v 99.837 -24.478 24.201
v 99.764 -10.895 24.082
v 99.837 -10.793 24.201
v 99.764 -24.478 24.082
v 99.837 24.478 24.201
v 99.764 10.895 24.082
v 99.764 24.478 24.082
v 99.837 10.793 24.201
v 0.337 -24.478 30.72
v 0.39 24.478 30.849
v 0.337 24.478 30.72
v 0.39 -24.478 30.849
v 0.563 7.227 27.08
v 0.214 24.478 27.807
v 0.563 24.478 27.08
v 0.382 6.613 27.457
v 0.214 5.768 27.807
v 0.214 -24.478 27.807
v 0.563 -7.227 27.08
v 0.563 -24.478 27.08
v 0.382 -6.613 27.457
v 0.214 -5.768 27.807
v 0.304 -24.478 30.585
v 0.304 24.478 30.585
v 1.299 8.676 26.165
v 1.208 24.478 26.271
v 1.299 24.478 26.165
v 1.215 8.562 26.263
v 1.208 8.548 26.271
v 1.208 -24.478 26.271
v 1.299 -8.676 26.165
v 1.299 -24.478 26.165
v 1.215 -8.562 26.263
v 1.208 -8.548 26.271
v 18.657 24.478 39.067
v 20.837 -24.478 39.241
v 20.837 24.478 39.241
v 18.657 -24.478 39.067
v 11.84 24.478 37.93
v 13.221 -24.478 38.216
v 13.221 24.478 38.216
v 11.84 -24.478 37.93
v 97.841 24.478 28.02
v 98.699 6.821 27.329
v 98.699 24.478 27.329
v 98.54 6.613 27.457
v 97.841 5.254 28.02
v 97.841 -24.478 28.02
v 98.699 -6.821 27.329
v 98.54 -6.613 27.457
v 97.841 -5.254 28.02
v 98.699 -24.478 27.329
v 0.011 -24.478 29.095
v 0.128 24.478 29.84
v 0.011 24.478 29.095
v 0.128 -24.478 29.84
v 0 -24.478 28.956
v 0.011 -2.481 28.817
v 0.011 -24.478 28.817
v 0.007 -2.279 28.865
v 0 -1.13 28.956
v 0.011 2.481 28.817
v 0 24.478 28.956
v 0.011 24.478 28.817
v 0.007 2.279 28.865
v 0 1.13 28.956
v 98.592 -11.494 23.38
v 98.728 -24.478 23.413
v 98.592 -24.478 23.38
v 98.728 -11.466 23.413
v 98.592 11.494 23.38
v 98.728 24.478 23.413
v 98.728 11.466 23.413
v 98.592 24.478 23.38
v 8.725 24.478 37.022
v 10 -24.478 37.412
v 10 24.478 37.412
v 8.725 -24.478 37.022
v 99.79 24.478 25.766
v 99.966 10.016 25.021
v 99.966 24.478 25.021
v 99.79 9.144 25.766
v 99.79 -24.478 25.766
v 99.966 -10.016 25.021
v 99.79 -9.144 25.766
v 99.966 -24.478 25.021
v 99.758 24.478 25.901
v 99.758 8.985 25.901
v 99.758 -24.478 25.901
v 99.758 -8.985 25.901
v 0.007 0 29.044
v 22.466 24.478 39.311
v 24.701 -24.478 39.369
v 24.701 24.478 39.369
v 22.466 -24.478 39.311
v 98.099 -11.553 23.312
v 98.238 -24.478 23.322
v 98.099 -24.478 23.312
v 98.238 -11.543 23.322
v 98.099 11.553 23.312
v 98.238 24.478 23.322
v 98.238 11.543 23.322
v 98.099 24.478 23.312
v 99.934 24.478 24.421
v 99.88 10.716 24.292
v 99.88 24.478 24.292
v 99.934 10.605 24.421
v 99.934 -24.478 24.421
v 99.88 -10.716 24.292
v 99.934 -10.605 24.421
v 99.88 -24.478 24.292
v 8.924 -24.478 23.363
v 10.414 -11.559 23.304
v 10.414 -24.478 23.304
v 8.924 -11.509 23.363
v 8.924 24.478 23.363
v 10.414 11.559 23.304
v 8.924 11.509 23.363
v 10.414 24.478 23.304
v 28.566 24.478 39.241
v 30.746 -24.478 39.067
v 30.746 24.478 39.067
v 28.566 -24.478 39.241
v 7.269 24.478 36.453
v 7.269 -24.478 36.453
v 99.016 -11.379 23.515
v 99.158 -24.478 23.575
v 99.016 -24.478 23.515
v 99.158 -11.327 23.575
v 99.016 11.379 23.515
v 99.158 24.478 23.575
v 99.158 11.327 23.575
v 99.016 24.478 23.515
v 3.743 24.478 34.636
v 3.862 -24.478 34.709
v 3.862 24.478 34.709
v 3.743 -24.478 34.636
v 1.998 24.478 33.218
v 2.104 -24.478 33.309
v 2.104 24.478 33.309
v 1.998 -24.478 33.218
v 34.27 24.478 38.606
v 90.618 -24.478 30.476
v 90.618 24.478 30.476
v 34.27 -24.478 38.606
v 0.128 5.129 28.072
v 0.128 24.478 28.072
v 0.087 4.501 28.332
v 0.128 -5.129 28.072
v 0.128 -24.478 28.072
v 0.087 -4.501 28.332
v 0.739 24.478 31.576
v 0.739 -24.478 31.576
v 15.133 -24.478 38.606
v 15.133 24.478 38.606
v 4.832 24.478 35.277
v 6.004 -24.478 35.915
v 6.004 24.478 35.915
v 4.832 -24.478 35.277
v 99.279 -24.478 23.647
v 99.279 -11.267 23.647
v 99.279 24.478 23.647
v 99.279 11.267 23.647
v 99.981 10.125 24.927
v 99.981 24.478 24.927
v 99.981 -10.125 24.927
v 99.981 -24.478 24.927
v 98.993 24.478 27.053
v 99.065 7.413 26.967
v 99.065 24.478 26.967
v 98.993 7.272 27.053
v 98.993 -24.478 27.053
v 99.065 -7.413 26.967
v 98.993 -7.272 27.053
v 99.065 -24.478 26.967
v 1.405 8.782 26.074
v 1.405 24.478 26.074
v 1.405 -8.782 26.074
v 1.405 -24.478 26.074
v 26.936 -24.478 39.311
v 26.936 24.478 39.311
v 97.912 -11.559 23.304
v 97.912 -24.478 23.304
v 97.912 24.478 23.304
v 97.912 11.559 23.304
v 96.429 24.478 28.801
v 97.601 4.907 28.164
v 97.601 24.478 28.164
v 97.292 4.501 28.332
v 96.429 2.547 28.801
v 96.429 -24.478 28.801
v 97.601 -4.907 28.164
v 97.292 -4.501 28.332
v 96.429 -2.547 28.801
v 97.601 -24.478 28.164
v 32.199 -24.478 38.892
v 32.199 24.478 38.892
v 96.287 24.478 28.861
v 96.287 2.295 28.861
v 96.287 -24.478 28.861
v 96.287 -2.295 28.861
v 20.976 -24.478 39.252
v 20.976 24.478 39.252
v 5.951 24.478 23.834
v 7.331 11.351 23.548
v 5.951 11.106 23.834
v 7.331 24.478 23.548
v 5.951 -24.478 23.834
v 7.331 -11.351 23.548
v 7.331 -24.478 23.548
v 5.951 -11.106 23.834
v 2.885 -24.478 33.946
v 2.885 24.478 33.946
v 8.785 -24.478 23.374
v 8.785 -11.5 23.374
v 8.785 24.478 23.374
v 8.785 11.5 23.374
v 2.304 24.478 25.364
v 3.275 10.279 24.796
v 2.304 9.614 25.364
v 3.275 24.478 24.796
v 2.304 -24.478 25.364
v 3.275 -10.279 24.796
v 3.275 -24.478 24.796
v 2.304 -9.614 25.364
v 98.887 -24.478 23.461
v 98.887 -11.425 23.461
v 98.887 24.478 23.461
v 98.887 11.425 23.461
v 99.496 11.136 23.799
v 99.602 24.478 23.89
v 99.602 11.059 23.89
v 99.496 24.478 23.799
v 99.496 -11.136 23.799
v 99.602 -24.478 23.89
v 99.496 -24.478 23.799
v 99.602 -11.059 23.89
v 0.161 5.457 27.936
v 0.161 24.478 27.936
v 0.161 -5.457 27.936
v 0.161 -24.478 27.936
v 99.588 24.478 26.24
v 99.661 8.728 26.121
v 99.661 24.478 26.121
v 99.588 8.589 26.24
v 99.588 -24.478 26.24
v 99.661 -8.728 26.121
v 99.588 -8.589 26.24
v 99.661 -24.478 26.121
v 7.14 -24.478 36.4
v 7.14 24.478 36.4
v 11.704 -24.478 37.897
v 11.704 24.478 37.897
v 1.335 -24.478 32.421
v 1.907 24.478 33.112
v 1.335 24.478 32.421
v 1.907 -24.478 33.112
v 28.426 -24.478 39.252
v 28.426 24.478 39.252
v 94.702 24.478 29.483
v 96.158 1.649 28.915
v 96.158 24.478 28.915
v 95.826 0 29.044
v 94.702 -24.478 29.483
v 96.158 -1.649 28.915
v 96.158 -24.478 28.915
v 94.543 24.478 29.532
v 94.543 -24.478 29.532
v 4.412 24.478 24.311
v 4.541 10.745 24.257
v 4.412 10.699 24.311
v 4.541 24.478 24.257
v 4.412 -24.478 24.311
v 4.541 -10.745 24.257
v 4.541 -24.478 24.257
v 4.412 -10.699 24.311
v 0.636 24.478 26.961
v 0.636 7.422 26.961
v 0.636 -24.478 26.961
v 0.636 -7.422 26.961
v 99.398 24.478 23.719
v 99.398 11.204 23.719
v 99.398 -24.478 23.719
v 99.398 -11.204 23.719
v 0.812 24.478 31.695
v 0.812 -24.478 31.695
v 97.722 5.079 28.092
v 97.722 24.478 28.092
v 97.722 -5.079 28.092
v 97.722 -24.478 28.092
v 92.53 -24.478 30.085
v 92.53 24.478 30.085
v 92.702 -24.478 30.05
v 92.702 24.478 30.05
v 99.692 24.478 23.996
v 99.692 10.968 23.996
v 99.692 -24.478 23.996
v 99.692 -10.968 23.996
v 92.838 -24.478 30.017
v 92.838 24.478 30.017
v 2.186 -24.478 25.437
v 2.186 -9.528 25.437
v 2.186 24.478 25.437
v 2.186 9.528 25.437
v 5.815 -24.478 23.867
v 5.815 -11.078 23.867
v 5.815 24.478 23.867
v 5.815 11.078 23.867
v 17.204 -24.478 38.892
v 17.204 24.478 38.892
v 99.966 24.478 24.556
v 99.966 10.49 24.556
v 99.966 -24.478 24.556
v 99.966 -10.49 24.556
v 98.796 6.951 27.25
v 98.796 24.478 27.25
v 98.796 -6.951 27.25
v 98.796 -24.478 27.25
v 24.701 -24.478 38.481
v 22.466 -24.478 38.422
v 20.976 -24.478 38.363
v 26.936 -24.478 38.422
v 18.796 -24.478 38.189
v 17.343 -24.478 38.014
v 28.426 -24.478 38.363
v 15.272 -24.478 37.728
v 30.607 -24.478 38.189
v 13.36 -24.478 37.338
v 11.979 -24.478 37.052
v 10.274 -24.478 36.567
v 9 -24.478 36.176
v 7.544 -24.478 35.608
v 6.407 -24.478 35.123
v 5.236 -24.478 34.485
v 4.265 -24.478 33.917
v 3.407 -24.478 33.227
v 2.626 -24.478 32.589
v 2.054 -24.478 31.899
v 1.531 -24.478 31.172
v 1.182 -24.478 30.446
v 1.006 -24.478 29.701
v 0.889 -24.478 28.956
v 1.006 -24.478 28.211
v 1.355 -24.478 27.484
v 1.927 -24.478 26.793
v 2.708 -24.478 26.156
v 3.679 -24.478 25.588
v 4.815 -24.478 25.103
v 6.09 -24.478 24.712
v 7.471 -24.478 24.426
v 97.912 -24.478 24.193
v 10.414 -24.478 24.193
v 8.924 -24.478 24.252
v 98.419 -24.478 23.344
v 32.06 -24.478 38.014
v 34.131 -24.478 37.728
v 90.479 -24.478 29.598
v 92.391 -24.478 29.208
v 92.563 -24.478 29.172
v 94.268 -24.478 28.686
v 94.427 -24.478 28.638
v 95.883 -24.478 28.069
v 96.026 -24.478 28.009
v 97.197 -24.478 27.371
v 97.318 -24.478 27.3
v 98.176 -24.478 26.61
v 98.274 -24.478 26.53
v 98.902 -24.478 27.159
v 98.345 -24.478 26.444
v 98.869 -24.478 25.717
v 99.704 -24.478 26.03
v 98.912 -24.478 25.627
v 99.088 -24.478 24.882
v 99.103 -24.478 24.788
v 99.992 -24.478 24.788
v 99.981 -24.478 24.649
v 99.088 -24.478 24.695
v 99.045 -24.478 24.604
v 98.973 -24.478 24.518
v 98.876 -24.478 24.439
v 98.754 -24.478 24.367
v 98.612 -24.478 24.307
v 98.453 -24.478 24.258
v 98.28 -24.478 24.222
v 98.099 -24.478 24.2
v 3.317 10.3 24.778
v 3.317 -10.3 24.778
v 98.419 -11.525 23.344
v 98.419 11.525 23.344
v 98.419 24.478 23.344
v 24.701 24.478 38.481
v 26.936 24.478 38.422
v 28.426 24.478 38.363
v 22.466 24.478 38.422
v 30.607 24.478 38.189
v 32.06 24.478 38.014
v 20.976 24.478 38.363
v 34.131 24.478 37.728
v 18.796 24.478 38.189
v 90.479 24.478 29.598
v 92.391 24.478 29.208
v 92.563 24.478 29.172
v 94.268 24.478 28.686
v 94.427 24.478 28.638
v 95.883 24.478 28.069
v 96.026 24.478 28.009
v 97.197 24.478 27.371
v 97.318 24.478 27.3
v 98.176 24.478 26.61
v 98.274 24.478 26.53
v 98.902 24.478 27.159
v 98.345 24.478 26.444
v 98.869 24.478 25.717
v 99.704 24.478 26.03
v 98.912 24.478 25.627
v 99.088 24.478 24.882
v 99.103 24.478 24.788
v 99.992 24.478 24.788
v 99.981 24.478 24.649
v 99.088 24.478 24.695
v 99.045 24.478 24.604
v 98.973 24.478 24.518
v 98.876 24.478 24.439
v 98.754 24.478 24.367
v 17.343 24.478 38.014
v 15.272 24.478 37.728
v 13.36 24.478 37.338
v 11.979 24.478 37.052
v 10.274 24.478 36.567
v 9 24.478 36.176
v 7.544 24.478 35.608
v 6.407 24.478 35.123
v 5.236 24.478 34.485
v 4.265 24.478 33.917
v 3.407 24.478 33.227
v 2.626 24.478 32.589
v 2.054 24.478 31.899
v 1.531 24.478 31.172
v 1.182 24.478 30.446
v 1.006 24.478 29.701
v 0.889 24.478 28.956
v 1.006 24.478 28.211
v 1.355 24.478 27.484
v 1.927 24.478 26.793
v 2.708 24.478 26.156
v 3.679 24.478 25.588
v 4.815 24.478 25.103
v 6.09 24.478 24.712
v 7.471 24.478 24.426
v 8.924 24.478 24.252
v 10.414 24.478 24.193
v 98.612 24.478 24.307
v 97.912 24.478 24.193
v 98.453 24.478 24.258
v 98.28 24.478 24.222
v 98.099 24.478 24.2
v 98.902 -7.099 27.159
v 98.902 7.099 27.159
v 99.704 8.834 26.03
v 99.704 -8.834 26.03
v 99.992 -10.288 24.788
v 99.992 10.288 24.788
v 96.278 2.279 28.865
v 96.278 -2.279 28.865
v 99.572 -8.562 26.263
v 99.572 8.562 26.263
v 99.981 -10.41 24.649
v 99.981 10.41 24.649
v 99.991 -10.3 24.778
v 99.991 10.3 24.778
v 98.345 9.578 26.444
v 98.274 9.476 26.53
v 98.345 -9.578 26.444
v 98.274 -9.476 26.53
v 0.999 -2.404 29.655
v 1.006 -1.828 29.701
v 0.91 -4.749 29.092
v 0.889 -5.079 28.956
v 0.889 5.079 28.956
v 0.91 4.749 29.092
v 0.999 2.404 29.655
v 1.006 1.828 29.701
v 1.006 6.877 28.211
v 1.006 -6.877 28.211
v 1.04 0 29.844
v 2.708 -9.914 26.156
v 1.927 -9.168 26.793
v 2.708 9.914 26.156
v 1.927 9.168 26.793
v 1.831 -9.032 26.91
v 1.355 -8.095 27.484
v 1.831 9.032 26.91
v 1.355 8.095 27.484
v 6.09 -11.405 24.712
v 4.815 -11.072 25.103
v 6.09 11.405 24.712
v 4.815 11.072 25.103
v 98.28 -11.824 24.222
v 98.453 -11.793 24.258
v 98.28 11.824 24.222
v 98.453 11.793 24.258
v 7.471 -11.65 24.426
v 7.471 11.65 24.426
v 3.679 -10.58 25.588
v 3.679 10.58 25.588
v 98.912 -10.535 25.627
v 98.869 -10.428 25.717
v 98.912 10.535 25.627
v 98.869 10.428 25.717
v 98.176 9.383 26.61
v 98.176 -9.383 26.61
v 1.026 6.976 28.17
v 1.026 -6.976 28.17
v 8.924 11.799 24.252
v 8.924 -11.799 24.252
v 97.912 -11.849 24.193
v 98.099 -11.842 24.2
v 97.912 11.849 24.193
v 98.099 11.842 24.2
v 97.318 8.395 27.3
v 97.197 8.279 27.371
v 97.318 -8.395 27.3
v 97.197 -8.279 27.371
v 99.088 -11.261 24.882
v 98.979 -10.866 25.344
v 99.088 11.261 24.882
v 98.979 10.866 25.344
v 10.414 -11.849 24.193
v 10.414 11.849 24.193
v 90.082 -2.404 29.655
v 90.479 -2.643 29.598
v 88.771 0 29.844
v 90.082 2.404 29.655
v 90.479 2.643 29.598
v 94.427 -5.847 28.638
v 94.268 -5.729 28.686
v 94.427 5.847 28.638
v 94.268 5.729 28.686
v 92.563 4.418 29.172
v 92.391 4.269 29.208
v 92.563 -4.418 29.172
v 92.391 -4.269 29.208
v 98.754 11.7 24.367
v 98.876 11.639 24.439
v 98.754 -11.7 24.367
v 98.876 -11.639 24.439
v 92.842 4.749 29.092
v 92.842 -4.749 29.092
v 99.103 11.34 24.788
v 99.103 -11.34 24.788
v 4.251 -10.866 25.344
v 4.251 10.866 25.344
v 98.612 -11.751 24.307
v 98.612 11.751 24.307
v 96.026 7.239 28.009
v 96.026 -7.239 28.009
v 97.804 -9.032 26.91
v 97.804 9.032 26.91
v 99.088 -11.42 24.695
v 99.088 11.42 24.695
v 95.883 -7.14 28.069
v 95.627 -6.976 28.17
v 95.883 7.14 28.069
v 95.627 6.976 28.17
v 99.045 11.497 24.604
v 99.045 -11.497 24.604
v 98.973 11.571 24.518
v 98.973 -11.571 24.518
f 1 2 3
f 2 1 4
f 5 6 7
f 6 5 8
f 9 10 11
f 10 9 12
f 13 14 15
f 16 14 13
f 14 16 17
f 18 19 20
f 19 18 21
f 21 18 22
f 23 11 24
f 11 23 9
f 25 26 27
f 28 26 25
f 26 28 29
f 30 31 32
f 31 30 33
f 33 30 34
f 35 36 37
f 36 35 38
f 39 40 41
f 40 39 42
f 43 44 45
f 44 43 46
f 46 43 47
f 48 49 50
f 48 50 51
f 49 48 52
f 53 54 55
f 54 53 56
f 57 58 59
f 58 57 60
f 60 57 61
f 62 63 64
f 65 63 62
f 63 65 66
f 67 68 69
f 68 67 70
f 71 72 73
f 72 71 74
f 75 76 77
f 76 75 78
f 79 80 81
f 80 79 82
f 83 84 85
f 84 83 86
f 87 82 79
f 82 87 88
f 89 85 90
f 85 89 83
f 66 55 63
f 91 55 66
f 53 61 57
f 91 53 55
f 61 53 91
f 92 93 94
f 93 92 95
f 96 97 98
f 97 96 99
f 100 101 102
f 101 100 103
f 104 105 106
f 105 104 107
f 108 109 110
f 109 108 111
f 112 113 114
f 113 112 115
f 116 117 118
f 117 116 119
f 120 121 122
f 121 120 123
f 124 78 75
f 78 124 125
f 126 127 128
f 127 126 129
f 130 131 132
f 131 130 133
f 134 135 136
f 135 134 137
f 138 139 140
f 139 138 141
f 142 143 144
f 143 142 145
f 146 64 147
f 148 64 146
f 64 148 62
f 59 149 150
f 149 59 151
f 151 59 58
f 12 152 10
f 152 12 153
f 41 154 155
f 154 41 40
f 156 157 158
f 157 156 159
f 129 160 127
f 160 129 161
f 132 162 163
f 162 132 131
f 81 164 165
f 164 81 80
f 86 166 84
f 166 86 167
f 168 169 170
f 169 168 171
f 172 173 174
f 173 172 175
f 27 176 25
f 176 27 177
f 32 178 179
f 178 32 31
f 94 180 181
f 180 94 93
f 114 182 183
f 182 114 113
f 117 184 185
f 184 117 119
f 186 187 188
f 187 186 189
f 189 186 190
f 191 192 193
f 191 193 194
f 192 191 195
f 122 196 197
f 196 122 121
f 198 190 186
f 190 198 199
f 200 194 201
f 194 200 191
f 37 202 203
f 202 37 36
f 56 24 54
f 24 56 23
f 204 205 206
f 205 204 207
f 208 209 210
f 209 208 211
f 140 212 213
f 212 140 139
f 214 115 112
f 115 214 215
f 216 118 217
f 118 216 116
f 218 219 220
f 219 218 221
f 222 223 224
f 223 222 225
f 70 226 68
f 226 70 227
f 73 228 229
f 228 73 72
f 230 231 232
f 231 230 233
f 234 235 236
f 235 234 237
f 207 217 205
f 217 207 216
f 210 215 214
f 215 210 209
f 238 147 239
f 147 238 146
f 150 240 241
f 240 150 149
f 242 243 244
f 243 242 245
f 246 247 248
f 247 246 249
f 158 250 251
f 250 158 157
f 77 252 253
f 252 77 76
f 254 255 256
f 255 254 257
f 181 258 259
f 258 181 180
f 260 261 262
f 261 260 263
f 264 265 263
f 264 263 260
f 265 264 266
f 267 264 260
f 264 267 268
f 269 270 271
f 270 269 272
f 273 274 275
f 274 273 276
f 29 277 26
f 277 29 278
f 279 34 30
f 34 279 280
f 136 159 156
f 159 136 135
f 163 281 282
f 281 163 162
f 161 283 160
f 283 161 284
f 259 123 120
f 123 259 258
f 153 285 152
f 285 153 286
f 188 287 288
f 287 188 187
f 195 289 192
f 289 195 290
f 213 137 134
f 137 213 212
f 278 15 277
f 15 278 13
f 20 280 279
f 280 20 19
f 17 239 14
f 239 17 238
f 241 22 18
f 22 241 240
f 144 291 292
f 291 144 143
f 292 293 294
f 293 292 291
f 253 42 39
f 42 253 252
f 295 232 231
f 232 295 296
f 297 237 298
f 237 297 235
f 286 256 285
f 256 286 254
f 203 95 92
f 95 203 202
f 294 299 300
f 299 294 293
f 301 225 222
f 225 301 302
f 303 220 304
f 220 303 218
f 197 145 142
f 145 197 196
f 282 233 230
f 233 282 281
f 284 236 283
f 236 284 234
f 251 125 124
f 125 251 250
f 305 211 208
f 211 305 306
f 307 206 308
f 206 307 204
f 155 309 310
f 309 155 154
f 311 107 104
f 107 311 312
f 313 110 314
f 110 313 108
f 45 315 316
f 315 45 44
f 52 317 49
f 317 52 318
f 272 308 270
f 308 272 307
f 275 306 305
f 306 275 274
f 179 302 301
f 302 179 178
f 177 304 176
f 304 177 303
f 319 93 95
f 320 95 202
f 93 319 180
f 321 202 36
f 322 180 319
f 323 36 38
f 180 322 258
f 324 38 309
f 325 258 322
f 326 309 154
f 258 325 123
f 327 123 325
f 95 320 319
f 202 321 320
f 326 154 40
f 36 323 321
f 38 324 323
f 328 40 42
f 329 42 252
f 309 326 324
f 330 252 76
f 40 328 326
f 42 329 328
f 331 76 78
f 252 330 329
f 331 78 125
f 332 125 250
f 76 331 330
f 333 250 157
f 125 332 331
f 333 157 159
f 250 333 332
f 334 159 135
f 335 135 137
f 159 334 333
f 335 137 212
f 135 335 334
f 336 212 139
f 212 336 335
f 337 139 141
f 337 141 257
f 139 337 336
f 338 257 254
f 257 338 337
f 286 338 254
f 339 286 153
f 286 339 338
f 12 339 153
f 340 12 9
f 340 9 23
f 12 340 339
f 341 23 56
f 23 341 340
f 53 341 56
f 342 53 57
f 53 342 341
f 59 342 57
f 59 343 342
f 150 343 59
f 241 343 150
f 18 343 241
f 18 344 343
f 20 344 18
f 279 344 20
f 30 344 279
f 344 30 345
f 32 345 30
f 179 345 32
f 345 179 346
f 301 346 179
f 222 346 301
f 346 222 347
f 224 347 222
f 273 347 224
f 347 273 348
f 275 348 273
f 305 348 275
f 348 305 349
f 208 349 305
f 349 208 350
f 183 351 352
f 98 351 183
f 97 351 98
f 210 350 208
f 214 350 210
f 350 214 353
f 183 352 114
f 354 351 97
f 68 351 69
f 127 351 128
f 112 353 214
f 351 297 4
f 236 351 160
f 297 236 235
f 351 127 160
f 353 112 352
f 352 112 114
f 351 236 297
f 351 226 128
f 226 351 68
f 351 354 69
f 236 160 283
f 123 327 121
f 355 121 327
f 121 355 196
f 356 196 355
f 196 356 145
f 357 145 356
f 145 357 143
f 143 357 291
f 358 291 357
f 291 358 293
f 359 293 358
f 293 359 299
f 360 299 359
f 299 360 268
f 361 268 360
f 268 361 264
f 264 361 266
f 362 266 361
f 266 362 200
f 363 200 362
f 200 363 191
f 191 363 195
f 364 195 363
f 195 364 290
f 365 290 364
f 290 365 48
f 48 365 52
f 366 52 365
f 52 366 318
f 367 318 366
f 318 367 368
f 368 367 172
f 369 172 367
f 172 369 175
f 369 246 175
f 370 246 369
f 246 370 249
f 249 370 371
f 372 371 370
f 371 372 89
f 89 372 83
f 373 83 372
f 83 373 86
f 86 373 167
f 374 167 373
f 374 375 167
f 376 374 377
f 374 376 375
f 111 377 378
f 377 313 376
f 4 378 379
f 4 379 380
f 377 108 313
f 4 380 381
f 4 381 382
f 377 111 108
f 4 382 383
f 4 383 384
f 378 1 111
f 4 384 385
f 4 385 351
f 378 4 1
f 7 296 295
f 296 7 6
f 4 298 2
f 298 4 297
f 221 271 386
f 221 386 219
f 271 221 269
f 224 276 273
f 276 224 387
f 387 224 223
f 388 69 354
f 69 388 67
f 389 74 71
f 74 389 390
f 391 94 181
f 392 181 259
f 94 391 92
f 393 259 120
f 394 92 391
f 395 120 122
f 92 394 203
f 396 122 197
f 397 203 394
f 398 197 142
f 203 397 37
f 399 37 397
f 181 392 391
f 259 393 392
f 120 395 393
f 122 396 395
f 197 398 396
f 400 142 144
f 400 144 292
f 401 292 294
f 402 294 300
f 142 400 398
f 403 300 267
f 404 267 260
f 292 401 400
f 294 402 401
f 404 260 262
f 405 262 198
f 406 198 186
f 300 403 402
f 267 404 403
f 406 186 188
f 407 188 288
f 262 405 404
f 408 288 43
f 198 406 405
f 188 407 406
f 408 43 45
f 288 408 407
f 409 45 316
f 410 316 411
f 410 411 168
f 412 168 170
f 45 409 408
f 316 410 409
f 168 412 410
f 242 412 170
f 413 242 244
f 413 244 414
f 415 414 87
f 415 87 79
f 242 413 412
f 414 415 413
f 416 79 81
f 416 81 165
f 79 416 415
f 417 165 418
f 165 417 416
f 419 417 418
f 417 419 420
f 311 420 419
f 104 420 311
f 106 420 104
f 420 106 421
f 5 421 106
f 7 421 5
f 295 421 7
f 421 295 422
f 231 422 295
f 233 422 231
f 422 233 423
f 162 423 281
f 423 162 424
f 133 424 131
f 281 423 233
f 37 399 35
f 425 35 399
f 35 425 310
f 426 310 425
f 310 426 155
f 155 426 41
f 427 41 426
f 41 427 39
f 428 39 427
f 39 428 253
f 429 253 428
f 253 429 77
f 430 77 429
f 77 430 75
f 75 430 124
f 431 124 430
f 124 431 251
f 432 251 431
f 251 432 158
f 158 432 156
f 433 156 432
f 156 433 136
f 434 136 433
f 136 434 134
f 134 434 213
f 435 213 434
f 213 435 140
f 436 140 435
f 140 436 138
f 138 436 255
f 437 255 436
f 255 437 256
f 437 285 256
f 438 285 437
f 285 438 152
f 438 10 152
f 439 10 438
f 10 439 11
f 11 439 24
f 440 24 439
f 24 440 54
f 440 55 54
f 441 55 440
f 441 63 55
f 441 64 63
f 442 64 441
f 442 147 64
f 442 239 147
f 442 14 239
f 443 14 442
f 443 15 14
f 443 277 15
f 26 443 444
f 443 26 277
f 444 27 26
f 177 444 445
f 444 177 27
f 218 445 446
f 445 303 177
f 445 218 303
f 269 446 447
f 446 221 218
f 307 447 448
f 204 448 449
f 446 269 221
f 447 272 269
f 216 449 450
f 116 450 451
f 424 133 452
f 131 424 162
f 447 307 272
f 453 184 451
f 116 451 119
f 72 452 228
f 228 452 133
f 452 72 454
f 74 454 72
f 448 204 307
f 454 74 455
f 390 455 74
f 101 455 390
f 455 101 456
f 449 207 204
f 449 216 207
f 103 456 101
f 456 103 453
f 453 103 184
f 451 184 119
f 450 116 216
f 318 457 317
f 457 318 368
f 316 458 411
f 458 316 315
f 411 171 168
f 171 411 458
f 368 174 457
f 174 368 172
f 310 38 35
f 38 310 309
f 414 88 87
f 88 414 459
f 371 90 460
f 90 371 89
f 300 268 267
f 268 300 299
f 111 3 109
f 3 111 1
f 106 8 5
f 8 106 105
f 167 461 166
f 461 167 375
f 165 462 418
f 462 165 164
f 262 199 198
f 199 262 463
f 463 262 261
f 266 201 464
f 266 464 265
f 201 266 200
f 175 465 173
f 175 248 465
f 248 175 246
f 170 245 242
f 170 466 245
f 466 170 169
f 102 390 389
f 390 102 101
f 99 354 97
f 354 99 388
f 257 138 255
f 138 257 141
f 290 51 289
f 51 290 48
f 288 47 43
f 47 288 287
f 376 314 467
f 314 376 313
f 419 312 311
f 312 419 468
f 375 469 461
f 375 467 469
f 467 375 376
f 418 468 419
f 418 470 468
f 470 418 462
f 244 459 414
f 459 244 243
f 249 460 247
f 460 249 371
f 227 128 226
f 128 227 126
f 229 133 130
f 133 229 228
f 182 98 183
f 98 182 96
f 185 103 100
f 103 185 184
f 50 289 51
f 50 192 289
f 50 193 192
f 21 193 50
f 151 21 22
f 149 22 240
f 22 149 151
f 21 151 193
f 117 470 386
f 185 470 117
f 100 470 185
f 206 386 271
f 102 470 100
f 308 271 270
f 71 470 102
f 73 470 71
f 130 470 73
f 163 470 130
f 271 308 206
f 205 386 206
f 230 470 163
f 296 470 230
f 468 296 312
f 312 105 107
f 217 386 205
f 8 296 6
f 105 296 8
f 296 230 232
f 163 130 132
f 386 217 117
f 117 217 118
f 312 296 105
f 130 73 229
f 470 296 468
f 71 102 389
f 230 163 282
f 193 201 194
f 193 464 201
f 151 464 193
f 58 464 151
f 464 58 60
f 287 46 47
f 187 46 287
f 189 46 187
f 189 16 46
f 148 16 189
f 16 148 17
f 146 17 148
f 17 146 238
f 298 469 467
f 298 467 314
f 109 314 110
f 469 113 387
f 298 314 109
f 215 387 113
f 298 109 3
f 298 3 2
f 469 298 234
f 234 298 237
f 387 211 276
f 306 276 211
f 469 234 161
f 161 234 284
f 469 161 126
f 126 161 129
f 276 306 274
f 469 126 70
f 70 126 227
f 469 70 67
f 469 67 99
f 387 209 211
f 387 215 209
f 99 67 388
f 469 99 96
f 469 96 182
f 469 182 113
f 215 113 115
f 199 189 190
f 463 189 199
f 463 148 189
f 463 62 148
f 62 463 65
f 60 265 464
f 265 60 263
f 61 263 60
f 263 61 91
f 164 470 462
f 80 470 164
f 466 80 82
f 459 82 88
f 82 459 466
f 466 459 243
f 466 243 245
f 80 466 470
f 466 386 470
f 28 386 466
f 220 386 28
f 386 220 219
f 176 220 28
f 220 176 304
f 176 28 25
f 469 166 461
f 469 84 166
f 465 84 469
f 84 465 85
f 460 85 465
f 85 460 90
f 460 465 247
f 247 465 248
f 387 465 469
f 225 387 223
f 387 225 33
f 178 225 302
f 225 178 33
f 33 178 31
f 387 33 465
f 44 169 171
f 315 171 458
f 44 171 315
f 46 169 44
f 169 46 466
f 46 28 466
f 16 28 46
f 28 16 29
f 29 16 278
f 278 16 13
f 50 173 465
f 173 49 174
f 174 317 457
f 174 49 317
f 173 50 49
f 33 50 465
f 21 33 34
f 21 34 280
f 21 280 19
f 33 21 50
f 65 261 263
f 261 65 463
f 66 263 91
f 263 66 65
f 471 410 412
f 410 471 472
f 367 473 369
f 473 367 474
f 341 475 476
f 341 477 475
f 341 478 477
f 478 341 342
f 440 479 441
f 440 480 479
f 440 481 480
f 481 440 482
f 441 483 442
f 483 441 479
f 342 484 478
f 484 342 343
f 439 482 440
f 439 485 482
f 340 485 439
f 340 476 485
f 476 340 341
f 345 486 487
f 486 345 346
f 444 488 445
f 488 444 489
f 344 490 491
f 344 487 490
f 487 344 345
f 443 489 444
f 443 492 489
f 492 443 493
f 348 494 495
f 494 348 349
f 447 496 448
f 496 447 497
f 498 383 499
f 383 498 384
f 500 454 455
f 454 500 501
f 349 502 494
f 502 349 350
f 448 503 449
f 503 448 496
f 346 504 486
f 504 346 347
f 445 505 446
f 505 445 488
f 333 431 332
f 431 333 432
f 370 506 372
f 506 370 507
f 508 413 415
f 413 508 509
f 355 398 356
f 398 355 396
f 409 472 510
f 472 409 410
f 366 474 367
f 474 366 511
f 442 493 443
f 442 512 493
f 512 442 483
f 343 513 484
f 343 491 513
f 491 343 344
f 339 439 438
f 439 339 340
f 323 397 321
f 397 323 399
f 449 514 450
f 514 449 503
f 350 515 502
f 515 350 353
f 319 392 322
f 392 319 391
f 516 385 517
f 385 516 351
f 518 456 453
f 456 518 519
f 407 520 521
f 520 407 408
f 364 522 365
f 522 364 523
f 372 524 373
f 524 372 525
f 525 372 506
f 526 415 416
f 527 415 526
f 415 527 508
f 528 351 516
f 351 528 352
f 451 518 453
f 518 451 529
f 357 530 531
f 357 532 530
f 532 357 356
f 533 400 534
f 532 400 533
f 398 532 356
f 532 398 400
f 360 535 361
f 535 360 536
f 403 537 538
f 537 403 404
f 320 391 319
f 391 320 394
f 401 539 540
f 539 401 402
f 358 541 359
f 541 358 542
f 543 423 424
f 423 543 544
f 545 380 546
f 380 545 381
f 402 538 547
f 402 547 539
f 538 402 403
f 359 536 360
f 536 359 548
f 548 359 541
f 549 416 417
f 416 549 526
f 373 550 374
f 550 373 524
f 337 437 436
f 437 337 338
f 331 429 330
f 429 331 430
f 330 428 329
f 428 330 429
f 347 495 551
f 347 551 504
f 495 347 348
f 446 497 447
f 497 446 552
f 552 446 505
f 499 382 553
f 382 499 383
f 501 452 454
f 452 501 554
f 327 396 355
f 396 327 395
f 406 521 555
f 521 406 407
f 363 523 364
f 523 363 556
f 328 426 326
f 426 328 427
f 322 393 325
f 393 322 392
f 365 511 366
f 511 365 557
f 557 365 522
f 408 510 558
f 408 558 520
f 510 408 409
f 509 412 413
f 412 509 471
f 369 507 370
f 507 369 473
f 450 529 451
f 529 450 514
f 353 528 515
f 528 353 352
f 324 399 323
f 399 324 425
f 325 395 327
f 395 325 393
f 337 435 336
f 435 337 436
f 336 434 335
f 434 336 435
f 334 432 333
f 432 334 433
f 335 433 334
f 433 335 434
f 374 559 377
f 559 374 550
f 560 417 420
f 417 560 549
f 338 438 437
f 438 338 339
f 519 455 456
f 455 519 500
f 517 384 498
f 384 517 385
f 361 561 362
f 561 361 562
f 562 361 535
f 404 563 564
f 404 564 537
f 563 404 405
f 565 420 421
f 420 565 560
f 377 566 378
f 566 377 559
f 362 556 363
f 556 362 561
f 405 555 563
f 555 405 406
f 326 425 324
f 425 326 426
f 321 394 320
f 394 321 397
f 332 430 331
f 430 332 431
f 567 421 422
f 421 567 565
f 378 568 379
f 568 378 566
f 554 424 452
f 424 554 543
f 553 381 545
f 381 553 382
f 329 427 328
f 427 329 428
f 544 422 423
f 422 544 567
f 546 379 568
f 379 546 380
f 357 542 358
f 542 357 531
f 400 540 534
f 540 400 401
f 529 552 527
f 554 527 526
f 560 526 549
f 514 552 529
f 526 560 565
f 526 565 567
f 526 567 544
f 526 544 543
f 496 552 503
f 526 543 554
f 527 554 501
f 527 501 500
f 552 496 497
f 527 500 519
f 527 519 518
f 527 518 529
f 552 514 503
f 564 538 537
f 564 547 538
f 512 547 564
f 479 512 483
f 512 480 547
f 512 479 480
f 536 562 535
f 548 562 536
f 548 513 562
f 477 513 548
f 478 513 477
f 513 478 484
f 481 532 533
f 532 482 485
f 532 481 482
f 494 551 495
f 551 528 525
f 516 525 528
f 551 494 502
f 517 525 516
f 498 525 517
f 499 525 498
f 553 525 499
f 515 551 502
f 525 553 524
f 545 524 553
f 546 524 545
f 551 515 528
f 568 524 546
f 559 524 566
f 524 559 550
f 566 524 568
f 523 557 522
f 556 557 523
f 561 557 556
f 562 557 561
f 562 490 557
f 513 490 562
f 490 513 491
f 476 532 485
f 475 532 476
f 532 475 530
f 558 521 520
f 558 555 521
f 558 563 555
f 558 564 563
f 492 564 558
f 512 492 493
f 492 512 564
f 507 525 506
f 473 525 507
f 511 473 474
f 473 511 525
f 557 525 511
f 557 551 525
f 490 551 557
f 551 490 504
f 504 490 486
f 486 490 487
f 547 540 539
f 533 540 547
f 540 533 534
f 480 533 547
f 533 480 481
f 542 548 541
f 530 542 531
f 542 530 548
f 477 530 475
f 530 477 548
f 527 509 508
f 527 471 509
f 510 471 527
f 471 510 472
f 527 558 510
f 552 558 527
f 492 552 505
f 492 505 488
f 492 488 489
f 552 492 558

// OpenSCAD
inch=25.4;
slip=0.007*inch;
kerf=0.0035*inch;
comfort=0.25;

build_stl=0;

fineness_stl=200;
fineness_low=40;

printer_bed=100;
printer_extruder=0.4;
printer_layer=0.31;

cargo_width=1*inch;
cargo_space=cargo_width+kerf*2;

hull_thickness=0.8;

hull_support=hull_thickness*2+kerf;

hull_width=cargo_width+kerf*4+hull_thickness*4;
hull_height=2*inch+hull_support*4+kerf*4;

conduit_large=cargo_width/2+kerf*2;

airframe_connector_length=5;
airframe_connector_seam=0.8;
airframe_lock_depth=0.1;
airframe_lock_length=0.3;
airframe_lock_float=0.1;

cabin_length=100;//4*inch;

wing_span=72*inch;
wing_root_chord=4*inch;
wing_segment=4*inch;
wing_root_height=0.75*inch;
wing_taper=.25*3/16*inch;
wing_dihedral_angle=5;

wing_connector_length=10;

wing_angle_of_attack=10;

tail_height=4*inch;
tail_rudder_chord=inch;
tail_taper_percent=0.5;

fineness=build_stl?fineness_stl:fineness_low;



module airframe_linkage(){
    difference(){
        hull(){
            translate([0,-0.5*(hull_height-hull_width),0])
            circle(0.5*hull_width,$fn=fineness);
            
            translate([0,0.5*(hull_height-hull_width),0])
            circle(0.5*hull_width,$fn=fineness);
        }
        square(cargo_space,center=true);
        
        translate([0,0.5*cargo_space+hull_support+conduit_large/2,0])
        circle(conduit_large/2,$fn=fineness);
        
        translate([0,-0.5*cargo_space-hull_support-conduit_large/2,0])
        circle(conduit_large/2,$fn=fineness);
    }
}

module airframe_inset(){
    difference(){
        hull(){
            translate([0,-0.5*(hull_height-hull_width),0])
            circle(0.5*hull_width-hull_support/2-kerf,$fn=fineness);
            
            translate([0,0.5*(hull_height-hull_width),0])
            circle(0.5*hull_width-hull_support/2-kerf,$fn=fineness);
        }
        square(size=[cargo_space,cargo_space+hull_support*2+kerf*2],center=true);
        
        translate([0,0.5*cargo_space+hull_support+kerf,0])
        circle(cargo_space/2,$fn=fineness);
        
        translate([0,-0.5*cargo_space-hull_support-kerf,0])
        circle(cargo_space/2,$fn=fineness);
    
    }
}

module airframe_outset(){
    difference(){
        hull(){
            translate([0,-0.5*(hull_height-hull_width),0])
            circle(0.5*hull_width,$fn=fineness);
            
            translate([0,0.5*(hull_height-hull_width),0])
            circle(0.5*hull_width,$fn=fineness);
        }
        
        //square(size=[cargo_space+hull_support+kerf*2,cargo_space+(hull_support+kerf)*2],center=true);
        
        hull(){
        translate([0,0.5*cargo_space+hull_support,0])
        circle(cargo_space/2+hull_support/2,$fn=fineness);
        
        translate([0,-0.5*cargo_space-hull_support-kerf,0])
        circle(cargo_space/2+hull_support/2,$fn=fineness);
        }
    }
}


module airframe_outset_cutout(){
    hull(){
            translate([0,-0.5*(hull_height-hull_width),0])
            circle(0.5*hull_width+kerf,$fn=fineness);
            
            translate([0,0.5*(hull_height-hull_width),0])
            circle(0.5*hull_width+kerf,$fn=fineness);
        }
}

module airframe_outset_shell(){
    hull(){
            translate([0,-0.5*(hull_height-hull_width),0])
            circle(0.5*hull_width+kerf+hull_thickness,$fn=fineness);
            
            translate([0,0.5*(hull_height-hull_width),0])
            circle(0.5*hull_width+kerf+hull_thickness,$fn=fineness);
        }
}

module airframe_lock(){
    linear_extrude(airframe_lock_length,convexity=10)
    difference(){
        hull(){
            translate([0,-0.5*(hull_height-hull_width),0])
            circle(0.5*hull_width-hull_thickness-kerf*2+airframe_lock_depth,$fn=fineness);
            
            translate([0,0.5*(hull_height-hull_width),0])
            circle(0.5*hull_width-hull_thickness-kerf*2+airframe_lock_depth,$fn=fineness);
        }
        hull(){
            translate([0,-0.5*(hull_height-hull_width),0])
            circle(0.5*hull_width-hull_thickness-kerf*2,$fn=fineness);
            
            translate([0,0.5*(hull_height-hull_width),0])
            circle(0.5*hull_width-hull_thickness-kerf*2,$fn=fineness);
        }
    }
}

module airframe_lock_cutout(){
    linear_extrude(airframe_lock_length+kerf*2,convexity=10)
    difference(){
        hull(){
            translate([0,-0.5*(hull_height-hull_width),0])
            circle(0.5*hull_width-hull_thickness-airframe_lock_depth+kerf*2,$fn=fineness);
            
            translate([0,0.5*(hull_height-hull_width),0])
            circle(0.5*hull_width-hull_thickness-airframe_lock_depth+kerf*2,$fn=fineness);
        }
    }
}

module airframe_connector(){
    translate([0,0,-airframe_connector_length-airframe_connector_seam/2])
    union(){
        linear_extrude(airframe_connector_length+0.001,convexity=10)
        airframe_inset();
            
        translate([0,0,airframe_connector_length-0.001])
        linear_extrude(airframe_connector_seam+0.002,convexity=10)
        airframe_linkage();

        translate([0,0,airframe_connector_seam+airframe_connector_length-0.001])
        linear_extrude(+airframe_connector_length+0.001,convexity=10)
        airframe_inset();
        
        
    translate([0,0,airframe_connector_length+airframe_connector_seam+(airframe_connector_length-airframe_lock_length)/2+airframe_lock_float])
airframe_lock();
        
        
    translate([0,0,(airframe_connector_length-airframe_lock_length)/2-airframe_lock_float])
airframe_lock();
        
    }
}

module airframe_cabin_section(){
    translate([0,0,-cabin_length/2])
    difference(){
        linear_extrude(cabin_length,convexity=10)
        airframe_outset();
    
        translate([0,0,(airframe_connector_length-airframe_lock_length)/2-kerf])
        airframe_lock_cutout();
        
        translate([0,0,cabin_length-(airframe_connector_length+airframe_lock_length)/2-kerf])
        airframe_lock_cutout();
    }
    
}

module airframe_deck_section(){
    union(){    
        difference(){
            union(){
                hull(){  
                    translate([0,hull_width/2,hull_thickness*5])
                    sphere(hull_width/2,$fn=fineness);
                    
                    translate([0,hull_width/4,hull_thickness*5])
                    scale([1,1,1.5])
                    sphere(hull_width/2,$fn=fineness);
                }

                hull(){
                    translate([0,hull_width/4,hull_thickness*5])
                    scale([1,1,1.5])
                    sphere(hull_width/2,$fn=fineness);
                    
                    translate([0,-hull_width/6,hull_thickness*5])
                    scale([1,1,3])
                    sphere(hull_width/2,$fn=fineness);
                }
                
                hull(){
                    translate([0,-hull_width/6,hull_thickness*5])
                    scale([1,1,3])
                    sphere(hull_width/2,$fn=fineness);
                    
                    translate([0,-hull_width/2,hull_thickness*5])
                    scale([1,1,2])
                    sphere(hull_width/2,$fn=fineness);
                }
            }
            
            
            union(){
                hull(){  
                    translate([0,hull_width/2,hull_thickness*5])
                    sphere(hull_width/2-hull_thickness,$fn=fineness);
                    
                    translate([0,hull_width/4,hull_thickness*5])
                    scale([1,1,1.5])
                    sphere(hull_width/2-hull_thickness,$fn=fineness);
                }

                hull(){
                    translate([0,hull_width/4,hull_thickness*5])
                    scale([1,1,1.5])
                    sphere(hull_width/2-hull_thickness,$fn=fineness);
                    
                    translate([0,-hull_width/6,hull_thickness*5])
                    scale([1,1,3])
                    sphere(hull_width/2-hull_thickness,$fn=fineness);
                }
                
                hull(){
                    translate([0,-hull_width/6,hull_thickness*5])
                    scale([1,1,3])
                    sphere(hull_width/2-hull_thickness,$fn=fineness);
                    
                    translate([0,-hull_width/2,hull_thickness*5])
                    scale([1,1,2])
                    sphere(hull_width/2-hull_thickness,$fn=fineness);
                }
            }
            
            translate([0,0,-hull_width*.75-0.001+hull_thickness*2.5])
            cube(size=[hull_width+0.002,hull_height+0.002,hull_width*1.5+0.001+hull_thickness*5],center=true);
            
            
        }
    
    
        linear_extrude(hull_thickness*5+0.001,convexity=10)
        airframe_outset();
        
    }
    
    
}
    
module airframe_tail_section(){
    translate([0,0,hull_thickness*5])
    difference(){
    
        hull(){
            translate([0,hull_height/2-hull_width/2,0])
            scale([1,1,2*(4*inch-hull_width/4-hull_thickness*5)/(hull_width)])
            sphere(hull_width/2,$fn=fineness);
            
            translate([0,-hull_height/2+hull_width/2,0])
            scale([1,1,1.25*(4*inch-hull_width/4)/(2*hull_width)])
            sphere(hull_width/2,$fn=fineness);
            
            
            translate([0,hull_height/2-hull_width/2,4*inch-hull_width/4-hull_thickness*5])
            sphere(hull_width/4,$fn=fineness);
        }
        
        hull(){
            
            translate([0,hull_height/2-hull_width/2,0])
            scale([1,1,2*(4*inch-hull_width/4-hull_thickness*5)/(hull_width)])
            sphere(hull_width/2-hull_thickness,$fn=fineness);
            
            translate([0,-hull_height/2+hull_width/2,0])
            scale([1,1,1.25*(4*inch-hull_width/4)/(2*hull_width)])
            sphere(hull_width/2-hull_thickness,$fn=fineness);
            
            
            translate([0,hull_height/2-hull_width/2,4*inch-hull_width/4-hull_thickness*5])
            sphere(hull_width/4-hull_thickness,$fn=fineness);
            
        }
        translate([0,0,-2*inch-0.001])
        cube(size=[hull_width+0.002,hull_height+0.002,4*inch+0.002],center=true);
    }
    difference(){
    linear_extrude(hull_thickness*5+0.001,convexity=10)
        airframe_outset();
        translate([0,0,(airframe_connector_length-airframe_lock_length)/2-kerf])
        airframe_lock_cutout();
    }
    
}


module wing_shape_outset(){
    minkowski(){
        hull(){
            translate([wing_root_height/4+wing_root_height/2+1.5*wing_root_height/3,0,0])
            scale([2,1])
            circle(wing_root_height/4,$fn=fineness);
          
            translate([wing_root_chord-.75*wing_root_height-wing_taper*2.5-hull_thickness*2,-wing_root_height/4+wing_taper/2,0])
            scale([2,1])
            circle(wing_taper/2,$fn=fineness);
        }     
        difference(){
            //translate([-wing_root_height*0.75,0,0])
            scale([3,1,1])
            circle(wing_root_height/4,$fn=fineness);
            translate([-wing_root_height/4*3,-wing_root_height/4,0])
            square([wing_root_height/4*6,wing_root_height/4]);
        }
        circle(hull_thickness+kerf,$fn=fineness);
    }
}

module wing_shape_inset(){
    minkowski(){
        hull(){
            translate([wing_root_height/4+wing_root_height/2+1.5*wing_root_height/3,0,0])
            scale([2,1])
            circle(wing_root_height/4,$fn=fineness);
          
            translate([wing_root_chord-.75*wing_root_height-wing_taper*2.5-hull_thickness*2,-wing_root_height/4+wing_taper/2,0])
            scale([2,1])
            circle(wing_taper/2,$fn=fineness);
        } 
        
        difference(){
            //translate([-wing_root_height*0.75,0,0])
            scale([3,1,1])
            circle(wing_root_height/4,$fn=fineness);
            translate([-wing_root_height/4*3,-wing_root_height/4,0])
            square([wing_root_height/4*6,wing_root_height/4]);
        }
        
        //circle(hull_thickness+kerf,$fn=fineness);
    }
}

module wing_segment(){
    linear_extrude(wing_segment,convexity=10)
    difference(){
        wing_shape_outset();
        wing_shape_inset();
    }

}


module airframe_wing_mount(){  
    difference(){
        
        difference(){
            translate([0,0,hull_width])
            translate([0,hull_width/2+wing_connector_length,0])
            rotate([90,0,0])
            translate([hull_thickness+kerf,0,0])
            linear_extrude(hull_width+wing_connector_length*2,convexity=10)
            difference(){
                wing_shape_outset();
                //wing_shape_inset();
            }
            
            rotate([90,0,90])
            linear_extrude(100,convexity=10)
            airframe_outset_cutout();
        }
        
        difference(){
            translate([0,0,hull_width])
            translate([0,hull_width/2+wing_connector_length,0])
            rotate([90,0,0])
            translate([hull_thickness+kerf,0,0])
            linear_extrude(hull_width+wing_connector_length*2+0.0,convexity=10)
            difference(){
                //wing_shape_outset();
                wing_shape_inset();
            }
            
            rotate([90,0,90])
            linear_extrude(100,convexity=10)
            airframe_outset_shell();
        }
        
    }
}



module tail_shape(){
    difference(){
        hull(){
            translate([wing_root_height/4,0,0])
            circle(wing_root_height/4,$fn=fineness);
            
            translate([wing_root_chord-wing_root_height/8-tail_rudder_chord,0,0])
            circle(wing_root_height/8,$fn=fineness);
        }
        
        translate([wing_root_chord-wing_root_height/8-tail_rudder_chord,0,0])
        scale([1,1.25])
        circle(wing_root_height/8+0.001,$fn=fineness);
    }
}

module rudder_shape(){
    hull(){
        //translate([wing_root_height/8,0,0])
        circle(wing_root_height/8-kerf*2,$fn=fineness);
        
        translate([wing_root_height/8+tail_rudder_chord-kerf*2-wing_taper/2,0,0])
        circle(wing_taper/2,$fn=fineness);
    }
}


module tail(){
    union(){
       linear_extrude(1,convexity=10) 
        //linear_extrude(tail_height-wing_root_height/4+0.001,convexity=10,scale=[tail_taper_percent,tail_taper_percent])
        translate([-wing_root_chord+wing_root_height/8+tail_rudder_chord,0,0])
        difference(){
            tail_shape();
            offset(r=-hull_thickness)
            tail_shape();
        }
        /*
        translate([0,0,tail_height-wing_root_height/4])
        difference(){
            hull(){
                translate([(-wing_root_chord+tail_rudder_chord+wing_root_height/4+wing_root_height/8)*tail_taper_percent,0, ])
                scale(tail_taper_percent)
                sphere(wing_root_height/4,$fn=fineness);
                
                scale(tail_taper_percent)
                sphere(wing_root_height/8,$fn=fineness);
            }
            
            hull(){
                translate([(-wing_root_chord+tail_rudder_chord+wing_root_height/4+wing_root_height/8)*tail_taper_percent,0, ])
                scale(tail_taper_percent)
                sphere(wing_root_height/4-hull_thickness,$fn=fineness);
                
                scale(tail_taper_percent)
                sphere(wing_root_height/8-hull_thickness,$fn=fineness);
            }
            translate([(-wing_root_chord+tail_rudder_chord+wing_root_height/8)*tail_taper_percent,-wing_root_height/4,-wing_root_height/4])
            cube([(wing_root_chord-tail_rudder_chord)*tail_taper_percent,wing_root_height/2,wing_root_height/4]);
            
            
        }
        */
    }
}

module rudder(){
    linear_extrude(tail_height-wing_root_height/8-wing_root_height/4,convexity=10,scale=[tail_taper_percent,tail_taper_percent])
    difference(){
        rudder_shape();
        offset(r=-hull_thickness)
        rudder_shape();
    }
}


module airframe_assembled(){
    rotate([0,270,0])
    rotate([0,0,270])
    airframe_tail_section();
    
    translate([airframe_connector_seam/2+airframe_lock_float,0,0])
    rotate([0,270,0])
    rotate([0,0,270])
    airframe_connector();
        
        translate([airframe_connector_seam+airframe_lock_float*2,0,0])
    rotate([0,90,0])
    rotate([0,0,270])
        translate([0,0,cabin_length/2])
        airframe_cabin_section();
    
    
    translate([(airframe_connector_seam/2+airframe_lock_float)+(airframe_connector_seam+airframe_lock_float*2)+cabin_length,0,0])
    rotate([0,270,0])
    rotate([0,0,270])
    airframe_connector();
    
    
        translate([(airframe_connector_seam+airframe_lock_float*2)*2+cabin_length,0,0])
    rotate([0,90,0])
    rotate([0,0,270])
        translate([0,0,cabin_length/2])
        airframe_cabin_section();
    
    
    translate([(airframe_connector_seam/2+airframe_lock_float)+(airframe_connector_seam+airframe_lock_float*2)*2+cabin_length*2,0,0])
    rotate([0,270,0])
    rotate([0,0,270])
    airframe_connector();
    
    
        translate([(airframe_connector_seam+airframe_lock_float*2)*3+cabin_length*2,0,0])
    rotate([0,90,0])
    rotate([0,0,90])
    airframe_deck_section();
        //translate([0,0,cabin_length/2])
        //airframe_cabin_section();
        
        translate([cabin_length*1.5,0,0])
        rotate([0,0,180])
        airframe_wing_mount();
    
}

module airframe_test(){
difference(){
    union(){
        
    //airframe_assembled();
//rotate([90,0,0])
//airframe_deck_section();
//airframe_tail_section();
//airframe_cabin_section();
        /*
        translate([0,0,-airframe_connector_seam/2-airframe_lock_float])
        airframe_connector();
        
        translate([0,0,cabin_length+airframe_connector_seam/2+airframe_lock_float])
        airframe_connector();
*/
//translate([0,0,10])
airframe_wing_mount();


        
//rotate([0,0,-wing_angle_of_attack])
//wing_segment();

//cube([4*inch,1,1]);

//tail();
//rudder();
    }
    //translate([-100,0,-100])
    //cube(100);
}
}

color([0.8,0.4,0.4,0.6])
airframe_test();
//cube(1*inch*0.9,center=true);
